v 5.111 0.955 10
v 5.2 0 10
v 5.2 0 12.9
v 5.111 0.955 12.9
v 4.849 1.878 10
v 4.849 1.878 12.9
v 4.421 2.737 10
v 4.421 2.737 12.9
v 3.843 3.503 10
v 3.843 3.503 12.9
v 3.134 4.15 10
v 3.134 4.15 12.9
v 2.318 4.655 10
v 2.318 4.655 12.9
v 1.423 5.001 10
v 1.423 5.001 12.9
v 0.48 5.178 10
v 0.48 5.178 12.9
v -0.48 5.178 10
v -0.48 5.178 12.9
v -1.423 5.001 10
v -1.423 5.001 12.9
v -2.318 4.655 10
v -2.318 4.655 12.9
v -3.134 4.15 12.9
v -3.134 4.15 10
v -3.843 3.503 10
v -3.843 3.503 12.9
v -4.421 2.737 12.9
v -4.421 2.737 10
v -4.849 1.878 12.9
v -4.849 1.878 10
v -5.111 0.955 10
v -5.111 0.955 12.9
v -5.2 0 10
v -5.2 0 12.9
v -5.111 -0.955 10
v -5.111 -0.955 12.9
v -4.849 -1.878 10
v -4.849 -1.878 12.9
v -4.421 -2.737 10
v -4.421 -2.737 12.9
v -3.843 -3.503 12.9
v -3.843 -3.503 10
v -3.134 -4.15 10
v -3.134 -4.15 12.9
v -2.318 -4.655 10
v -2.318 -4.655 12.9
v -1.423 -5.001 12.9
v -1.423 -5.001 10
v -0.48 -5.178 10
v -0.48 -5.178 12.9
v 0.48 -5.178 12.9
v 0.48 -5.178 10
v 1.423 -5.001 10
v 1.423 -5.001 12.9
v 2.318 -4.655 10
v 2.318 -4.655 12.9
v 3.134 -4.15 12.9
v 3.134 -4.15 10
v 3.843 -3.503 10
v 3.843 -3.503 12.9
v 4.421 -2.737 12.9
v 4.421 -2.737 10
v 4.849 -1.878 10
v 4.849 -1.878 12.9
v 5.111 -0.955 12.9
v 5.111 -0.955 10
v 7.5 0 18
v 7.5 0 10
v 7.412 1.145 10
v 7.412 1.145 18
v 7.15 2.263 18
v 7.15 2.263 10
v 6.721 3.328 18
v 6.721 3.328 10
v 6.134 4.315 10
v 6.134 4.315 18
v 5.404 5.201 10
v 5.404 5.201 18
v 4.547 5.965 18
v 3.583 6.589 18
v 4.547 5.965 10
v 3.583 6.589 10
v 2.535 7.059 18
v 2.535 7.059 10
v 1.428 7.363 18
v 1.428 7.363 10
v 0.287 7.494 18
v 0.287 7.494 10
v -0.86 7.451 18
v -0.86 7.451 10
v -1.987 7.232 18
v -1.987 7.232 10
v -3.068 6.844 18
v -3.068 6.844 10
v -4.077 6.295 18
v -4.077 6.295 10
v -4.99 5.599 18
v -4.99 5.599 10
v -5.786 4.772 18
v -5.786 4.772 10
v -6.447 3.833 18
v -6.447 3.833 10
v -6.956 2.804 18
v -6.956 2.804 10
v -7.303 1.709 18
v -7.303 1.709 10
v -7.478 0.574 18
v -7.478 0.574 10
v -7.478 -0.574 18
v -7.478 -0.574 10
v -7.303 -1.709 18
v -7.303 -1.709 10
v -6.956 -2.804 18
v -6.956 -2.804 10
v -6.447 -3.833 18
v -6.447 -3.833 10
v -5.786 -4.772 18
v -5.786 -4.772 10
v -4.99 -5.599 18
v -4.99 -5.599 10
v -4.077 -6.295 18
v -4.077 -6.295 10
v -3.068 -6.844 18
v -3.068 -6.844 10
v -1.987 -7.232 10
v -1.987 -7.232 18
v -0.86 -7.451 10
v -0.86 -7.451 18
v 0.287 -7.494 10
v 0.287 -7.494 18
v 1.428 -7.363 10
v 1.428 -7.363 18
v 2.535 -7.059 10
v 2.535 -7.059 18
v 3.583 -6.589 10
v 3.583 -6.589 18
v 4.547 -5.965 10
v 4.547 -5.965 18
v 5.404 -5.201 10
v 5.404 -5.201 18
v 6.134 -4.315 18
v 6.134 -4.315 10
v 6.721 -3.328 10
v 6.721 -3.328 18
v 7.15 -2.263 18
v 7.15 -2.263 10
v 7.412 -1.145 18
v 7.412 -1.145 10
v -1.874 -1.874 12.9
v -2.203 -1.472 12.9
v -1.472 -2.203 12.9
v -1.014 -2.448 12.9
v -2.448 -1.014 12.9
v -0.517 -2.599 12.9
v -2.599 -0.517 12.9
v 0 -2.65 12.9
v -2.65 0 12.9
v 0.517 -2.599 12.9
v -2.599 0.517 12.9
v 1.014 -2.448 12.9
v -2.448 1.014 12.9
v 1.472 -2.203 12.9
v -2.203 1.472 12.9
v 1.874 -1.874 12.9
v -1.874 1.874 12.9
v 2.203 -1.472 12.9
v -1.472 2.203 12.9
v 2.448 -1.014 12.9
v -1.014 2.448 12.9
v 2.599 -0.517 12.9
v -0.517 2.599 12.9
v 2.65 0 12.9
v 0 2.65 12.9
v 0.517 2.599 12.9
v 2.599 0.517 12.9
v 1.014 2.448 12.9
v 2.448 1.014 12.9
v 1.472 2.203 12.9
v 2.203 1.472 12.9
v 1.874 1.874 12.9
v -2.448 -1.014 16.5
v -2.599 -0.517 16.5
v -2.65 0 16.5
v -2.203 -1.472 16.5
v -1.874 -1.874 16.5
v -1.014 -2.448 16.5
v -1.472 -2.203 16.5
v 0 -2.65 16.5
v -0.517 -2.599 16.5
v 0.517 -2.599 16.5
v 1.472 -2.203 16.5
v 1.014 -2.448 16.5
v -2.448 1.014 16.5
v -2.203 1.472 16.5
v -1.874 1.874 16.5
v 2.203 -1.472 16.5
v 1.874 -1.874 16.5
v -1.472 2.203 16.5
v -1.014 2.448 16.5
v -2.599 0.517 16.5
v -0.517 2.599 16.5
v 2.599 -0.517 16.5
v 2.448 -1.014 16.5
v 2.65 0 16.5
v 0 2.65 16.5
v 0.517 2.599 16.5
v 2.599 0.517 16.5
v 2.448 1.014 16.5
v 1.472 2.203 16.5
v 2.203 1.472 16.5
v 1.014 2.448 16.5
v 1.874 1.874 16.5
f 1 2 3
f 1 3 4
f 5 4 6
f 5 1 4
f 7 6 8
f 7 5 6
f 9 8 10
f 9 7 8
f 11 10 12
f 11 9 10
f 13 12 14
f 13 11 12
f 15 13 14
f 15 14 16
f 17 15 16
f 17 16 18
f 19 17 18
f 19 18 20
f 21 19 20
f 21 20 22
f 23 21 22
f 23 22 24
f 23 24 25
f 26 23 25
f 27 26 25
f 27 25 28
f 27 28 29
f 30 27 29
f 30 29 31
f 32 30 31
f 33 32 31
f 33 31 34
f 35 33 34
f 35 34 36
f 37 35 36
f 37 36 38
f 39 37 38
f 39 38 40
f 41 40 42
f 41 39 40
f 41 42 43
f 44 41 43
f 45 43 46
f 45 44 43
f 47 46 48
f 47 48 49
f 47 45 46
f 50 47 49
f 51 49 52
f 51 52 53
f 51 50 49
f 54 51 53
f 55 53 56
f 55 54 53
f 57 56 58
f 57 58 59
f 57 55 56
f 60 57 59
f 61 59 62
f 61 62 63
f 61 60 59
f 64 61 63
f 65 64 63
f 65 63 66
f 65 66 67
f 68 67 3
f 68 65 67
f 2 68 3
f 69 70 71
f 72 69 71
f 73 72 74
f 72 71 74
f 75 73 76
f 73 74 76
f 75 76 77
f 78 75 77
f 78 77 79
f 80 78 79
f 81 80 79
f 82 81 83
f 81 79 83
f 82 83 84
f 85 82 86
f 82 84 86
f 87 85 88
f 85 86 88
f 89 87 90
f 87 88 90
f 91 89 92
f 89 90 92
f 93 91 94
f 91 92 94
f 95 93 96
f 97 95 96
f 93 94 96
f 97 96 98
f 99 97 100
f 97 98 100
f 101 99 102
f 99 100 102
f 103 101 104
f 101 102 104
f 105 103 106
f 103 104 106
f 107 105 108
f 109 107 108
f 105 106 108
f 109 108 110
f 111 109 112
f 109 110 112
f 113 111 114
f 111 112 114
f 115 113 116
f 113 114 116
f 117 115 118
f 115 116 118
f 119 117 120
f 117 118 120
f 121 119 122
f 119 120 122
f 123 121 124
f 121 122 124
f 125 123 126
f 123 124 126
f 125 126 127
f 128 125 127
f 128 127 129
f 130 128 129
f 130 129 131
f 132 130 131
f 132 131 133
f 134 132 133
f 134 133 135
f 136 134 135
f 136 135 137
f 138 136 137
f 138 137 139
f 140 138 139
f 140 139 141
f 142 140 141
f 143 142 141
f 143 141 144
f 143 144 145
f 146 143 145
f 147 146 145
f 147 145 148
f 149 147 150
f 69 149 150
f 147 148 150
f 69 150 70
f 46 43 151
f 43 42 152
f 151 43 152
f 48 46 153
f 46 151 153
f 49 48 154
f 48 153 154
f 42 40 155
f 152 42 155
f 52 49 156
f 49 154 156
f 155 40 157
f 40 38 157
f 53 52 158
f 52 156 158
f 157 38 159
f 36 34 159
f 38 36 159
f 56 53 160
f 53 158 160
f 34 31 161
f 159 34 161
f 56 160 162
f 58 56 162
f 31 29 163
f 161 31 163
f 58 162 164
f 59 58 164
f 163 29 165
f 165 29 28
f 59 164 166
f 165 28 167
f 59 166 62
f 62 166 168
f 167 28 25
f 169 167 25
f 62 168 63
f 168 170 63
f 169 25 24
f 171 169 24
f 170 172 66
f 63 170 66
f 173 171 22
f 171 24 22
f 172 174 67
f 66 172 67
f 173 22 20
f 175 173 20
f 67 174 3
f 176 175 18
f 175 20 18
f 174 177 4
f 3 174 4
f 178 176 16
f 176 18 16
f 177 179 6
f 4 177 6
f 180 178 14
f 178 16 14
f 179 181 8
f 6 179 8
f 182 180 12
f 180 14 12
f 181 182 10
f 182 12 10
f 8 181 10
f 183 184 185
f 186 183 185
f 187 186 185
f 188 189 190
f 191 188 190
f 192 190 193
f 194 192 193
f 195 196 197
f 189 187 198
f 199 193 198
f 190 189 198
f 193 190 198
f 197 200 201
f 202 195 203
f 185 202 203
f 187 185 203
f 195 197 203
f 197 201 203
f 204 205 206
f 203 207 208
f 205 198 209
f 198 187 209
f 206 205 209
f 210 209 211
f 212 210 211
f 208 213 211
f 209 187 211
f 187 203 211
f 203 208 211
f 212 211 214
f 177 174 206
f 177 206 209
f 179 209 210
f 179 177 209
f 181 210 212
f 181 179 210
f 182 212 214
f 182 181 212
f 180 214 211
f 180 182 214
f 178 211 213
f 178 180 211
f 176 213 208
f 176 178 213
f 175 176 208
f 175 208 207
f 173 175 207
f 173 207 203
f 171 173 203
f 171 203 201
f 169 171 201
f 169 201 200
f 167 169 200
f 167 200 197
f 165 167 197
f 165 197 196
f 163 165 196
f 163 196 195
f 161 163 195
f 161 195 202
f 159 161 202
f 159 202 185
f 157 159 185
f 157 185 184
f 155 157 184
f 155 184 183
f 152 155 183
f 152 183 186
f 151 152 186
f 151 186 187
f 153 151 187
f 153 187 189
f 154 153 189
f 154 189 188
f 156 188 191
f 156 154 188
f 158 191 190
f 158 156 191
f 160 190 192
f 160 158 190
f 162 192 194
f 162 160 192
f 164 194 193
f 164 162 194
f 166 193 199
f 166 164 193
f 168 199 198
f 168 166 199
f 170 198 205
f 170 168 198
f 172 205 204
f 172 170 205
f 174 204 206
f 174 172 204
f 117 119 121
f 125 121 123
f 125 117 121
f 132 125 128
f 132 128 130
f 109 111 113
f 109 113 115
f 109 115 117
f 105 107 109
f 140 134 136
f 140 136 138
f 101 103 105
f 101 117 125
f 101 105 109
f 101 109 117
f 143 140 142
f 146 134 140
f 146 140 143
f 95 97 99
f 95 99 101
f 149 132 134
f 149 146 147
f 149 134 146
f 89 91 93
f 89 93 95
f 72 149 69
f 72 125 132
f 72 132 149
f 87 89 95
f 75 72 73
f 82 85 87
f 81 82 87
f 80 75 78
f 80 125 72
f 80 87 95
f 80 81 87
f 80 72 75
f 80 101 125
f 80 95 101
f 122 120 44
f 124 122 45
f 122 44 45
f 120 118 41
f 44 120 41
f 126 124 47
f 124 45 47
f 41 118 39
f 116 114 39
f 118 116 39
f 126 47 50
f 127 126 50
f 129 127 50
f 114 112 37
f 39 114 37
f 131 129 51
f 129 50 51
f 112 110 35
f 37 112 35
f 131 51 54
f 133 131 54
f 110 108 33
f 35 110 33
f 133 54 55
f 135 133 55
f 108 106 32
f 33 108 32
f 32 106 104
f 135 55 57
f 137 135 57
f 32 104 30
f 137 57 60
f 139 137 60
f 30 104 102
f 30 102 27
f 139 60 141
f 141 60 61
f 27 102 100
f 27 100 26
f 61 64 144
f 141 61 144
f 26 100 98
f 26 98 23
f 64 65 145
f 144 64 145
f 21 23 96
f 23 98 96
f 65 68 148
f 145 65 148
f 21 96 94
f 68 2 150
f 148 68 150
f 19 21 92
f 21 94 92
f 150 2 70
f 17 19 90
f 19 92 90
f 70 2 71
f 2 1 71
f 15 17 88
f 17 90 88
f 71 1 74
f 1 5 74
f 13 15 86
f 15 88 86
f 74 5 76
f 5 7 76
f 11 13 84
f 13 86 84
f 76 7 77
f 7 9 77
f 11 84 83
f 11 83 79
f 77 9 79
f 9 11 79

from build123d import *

# Parameters (mm, degrees)
TUBE_R            = 5.2
TUBE_R_2          = 2.5
TUBE_DEPTH        = 3.9
CYLINDER001_R     = 2.65
CYLINDER001_DEPTH = 15
CYLINDER005_R     = 7.5
CYLINDER005_DEPTH = 8


with BuildPart() as lower_shaft_bearing:
    # Tube → Tube (new body)
    with BuildSketch(Plane.XY.offset(9)):
        Circle(TUBE_R)
        Circle(TUBE_R_2, mode=Mode.SUBTRACT)
    extrude(amount=TUBE_DEPTH)


with BuildPart() as lower_shaft_bearing_1:
    # BaseFeature004 placement: moved
    add(lower_shaft_bearing.part.moved(Location((0, 0, -9))))


with BuildPart() as lower_shaft_bearing_2:
    # Body038 placement: moved
    add(lower_shaft_bearing_1.part.moved(Location((0, 0, 9))))


with BuildPart() as fusion001:
    # Cylinder001 → Cylinder001 (new body)
    with BuildSketch(Plane.XY.offset(1.5)):
        Circle(CYLINDER001_R)
    extrude(amount=CYLINDER001_DEPTH)


with BuildPart() as fusion001_1:
    # BaseFeature003 placement: moved
    add(fusion001.part.moved(Location((0, 0, -1.5))))


with BuildPart() as fusion001_2:
    # Body014 placement: moved
    add(fusion001_1.part.moved(Location((0, 0, 1.5))))

    # Fusion001: union lower_shaft_bearing
    add(lower_shaft_bearing_2.part)


with BuildPart() as cut002:
    # Cylinder005 → Cylinder005 (join)
    with BuildSketch(Plane.XY):
        Circle(CYLINDER005_R)
    extrude(amount=CYLINDER005_DEPTH)


with BuildPart() as cut002_1:
    # Body019 placement: moved
    add(cut002.part.moved(Location((0, 0, 10))))

    # Cut002: cut Fusion001
    add(fusion001_2.part, mode=Mode.SUBTRACT)


solid = cut002_1.part
